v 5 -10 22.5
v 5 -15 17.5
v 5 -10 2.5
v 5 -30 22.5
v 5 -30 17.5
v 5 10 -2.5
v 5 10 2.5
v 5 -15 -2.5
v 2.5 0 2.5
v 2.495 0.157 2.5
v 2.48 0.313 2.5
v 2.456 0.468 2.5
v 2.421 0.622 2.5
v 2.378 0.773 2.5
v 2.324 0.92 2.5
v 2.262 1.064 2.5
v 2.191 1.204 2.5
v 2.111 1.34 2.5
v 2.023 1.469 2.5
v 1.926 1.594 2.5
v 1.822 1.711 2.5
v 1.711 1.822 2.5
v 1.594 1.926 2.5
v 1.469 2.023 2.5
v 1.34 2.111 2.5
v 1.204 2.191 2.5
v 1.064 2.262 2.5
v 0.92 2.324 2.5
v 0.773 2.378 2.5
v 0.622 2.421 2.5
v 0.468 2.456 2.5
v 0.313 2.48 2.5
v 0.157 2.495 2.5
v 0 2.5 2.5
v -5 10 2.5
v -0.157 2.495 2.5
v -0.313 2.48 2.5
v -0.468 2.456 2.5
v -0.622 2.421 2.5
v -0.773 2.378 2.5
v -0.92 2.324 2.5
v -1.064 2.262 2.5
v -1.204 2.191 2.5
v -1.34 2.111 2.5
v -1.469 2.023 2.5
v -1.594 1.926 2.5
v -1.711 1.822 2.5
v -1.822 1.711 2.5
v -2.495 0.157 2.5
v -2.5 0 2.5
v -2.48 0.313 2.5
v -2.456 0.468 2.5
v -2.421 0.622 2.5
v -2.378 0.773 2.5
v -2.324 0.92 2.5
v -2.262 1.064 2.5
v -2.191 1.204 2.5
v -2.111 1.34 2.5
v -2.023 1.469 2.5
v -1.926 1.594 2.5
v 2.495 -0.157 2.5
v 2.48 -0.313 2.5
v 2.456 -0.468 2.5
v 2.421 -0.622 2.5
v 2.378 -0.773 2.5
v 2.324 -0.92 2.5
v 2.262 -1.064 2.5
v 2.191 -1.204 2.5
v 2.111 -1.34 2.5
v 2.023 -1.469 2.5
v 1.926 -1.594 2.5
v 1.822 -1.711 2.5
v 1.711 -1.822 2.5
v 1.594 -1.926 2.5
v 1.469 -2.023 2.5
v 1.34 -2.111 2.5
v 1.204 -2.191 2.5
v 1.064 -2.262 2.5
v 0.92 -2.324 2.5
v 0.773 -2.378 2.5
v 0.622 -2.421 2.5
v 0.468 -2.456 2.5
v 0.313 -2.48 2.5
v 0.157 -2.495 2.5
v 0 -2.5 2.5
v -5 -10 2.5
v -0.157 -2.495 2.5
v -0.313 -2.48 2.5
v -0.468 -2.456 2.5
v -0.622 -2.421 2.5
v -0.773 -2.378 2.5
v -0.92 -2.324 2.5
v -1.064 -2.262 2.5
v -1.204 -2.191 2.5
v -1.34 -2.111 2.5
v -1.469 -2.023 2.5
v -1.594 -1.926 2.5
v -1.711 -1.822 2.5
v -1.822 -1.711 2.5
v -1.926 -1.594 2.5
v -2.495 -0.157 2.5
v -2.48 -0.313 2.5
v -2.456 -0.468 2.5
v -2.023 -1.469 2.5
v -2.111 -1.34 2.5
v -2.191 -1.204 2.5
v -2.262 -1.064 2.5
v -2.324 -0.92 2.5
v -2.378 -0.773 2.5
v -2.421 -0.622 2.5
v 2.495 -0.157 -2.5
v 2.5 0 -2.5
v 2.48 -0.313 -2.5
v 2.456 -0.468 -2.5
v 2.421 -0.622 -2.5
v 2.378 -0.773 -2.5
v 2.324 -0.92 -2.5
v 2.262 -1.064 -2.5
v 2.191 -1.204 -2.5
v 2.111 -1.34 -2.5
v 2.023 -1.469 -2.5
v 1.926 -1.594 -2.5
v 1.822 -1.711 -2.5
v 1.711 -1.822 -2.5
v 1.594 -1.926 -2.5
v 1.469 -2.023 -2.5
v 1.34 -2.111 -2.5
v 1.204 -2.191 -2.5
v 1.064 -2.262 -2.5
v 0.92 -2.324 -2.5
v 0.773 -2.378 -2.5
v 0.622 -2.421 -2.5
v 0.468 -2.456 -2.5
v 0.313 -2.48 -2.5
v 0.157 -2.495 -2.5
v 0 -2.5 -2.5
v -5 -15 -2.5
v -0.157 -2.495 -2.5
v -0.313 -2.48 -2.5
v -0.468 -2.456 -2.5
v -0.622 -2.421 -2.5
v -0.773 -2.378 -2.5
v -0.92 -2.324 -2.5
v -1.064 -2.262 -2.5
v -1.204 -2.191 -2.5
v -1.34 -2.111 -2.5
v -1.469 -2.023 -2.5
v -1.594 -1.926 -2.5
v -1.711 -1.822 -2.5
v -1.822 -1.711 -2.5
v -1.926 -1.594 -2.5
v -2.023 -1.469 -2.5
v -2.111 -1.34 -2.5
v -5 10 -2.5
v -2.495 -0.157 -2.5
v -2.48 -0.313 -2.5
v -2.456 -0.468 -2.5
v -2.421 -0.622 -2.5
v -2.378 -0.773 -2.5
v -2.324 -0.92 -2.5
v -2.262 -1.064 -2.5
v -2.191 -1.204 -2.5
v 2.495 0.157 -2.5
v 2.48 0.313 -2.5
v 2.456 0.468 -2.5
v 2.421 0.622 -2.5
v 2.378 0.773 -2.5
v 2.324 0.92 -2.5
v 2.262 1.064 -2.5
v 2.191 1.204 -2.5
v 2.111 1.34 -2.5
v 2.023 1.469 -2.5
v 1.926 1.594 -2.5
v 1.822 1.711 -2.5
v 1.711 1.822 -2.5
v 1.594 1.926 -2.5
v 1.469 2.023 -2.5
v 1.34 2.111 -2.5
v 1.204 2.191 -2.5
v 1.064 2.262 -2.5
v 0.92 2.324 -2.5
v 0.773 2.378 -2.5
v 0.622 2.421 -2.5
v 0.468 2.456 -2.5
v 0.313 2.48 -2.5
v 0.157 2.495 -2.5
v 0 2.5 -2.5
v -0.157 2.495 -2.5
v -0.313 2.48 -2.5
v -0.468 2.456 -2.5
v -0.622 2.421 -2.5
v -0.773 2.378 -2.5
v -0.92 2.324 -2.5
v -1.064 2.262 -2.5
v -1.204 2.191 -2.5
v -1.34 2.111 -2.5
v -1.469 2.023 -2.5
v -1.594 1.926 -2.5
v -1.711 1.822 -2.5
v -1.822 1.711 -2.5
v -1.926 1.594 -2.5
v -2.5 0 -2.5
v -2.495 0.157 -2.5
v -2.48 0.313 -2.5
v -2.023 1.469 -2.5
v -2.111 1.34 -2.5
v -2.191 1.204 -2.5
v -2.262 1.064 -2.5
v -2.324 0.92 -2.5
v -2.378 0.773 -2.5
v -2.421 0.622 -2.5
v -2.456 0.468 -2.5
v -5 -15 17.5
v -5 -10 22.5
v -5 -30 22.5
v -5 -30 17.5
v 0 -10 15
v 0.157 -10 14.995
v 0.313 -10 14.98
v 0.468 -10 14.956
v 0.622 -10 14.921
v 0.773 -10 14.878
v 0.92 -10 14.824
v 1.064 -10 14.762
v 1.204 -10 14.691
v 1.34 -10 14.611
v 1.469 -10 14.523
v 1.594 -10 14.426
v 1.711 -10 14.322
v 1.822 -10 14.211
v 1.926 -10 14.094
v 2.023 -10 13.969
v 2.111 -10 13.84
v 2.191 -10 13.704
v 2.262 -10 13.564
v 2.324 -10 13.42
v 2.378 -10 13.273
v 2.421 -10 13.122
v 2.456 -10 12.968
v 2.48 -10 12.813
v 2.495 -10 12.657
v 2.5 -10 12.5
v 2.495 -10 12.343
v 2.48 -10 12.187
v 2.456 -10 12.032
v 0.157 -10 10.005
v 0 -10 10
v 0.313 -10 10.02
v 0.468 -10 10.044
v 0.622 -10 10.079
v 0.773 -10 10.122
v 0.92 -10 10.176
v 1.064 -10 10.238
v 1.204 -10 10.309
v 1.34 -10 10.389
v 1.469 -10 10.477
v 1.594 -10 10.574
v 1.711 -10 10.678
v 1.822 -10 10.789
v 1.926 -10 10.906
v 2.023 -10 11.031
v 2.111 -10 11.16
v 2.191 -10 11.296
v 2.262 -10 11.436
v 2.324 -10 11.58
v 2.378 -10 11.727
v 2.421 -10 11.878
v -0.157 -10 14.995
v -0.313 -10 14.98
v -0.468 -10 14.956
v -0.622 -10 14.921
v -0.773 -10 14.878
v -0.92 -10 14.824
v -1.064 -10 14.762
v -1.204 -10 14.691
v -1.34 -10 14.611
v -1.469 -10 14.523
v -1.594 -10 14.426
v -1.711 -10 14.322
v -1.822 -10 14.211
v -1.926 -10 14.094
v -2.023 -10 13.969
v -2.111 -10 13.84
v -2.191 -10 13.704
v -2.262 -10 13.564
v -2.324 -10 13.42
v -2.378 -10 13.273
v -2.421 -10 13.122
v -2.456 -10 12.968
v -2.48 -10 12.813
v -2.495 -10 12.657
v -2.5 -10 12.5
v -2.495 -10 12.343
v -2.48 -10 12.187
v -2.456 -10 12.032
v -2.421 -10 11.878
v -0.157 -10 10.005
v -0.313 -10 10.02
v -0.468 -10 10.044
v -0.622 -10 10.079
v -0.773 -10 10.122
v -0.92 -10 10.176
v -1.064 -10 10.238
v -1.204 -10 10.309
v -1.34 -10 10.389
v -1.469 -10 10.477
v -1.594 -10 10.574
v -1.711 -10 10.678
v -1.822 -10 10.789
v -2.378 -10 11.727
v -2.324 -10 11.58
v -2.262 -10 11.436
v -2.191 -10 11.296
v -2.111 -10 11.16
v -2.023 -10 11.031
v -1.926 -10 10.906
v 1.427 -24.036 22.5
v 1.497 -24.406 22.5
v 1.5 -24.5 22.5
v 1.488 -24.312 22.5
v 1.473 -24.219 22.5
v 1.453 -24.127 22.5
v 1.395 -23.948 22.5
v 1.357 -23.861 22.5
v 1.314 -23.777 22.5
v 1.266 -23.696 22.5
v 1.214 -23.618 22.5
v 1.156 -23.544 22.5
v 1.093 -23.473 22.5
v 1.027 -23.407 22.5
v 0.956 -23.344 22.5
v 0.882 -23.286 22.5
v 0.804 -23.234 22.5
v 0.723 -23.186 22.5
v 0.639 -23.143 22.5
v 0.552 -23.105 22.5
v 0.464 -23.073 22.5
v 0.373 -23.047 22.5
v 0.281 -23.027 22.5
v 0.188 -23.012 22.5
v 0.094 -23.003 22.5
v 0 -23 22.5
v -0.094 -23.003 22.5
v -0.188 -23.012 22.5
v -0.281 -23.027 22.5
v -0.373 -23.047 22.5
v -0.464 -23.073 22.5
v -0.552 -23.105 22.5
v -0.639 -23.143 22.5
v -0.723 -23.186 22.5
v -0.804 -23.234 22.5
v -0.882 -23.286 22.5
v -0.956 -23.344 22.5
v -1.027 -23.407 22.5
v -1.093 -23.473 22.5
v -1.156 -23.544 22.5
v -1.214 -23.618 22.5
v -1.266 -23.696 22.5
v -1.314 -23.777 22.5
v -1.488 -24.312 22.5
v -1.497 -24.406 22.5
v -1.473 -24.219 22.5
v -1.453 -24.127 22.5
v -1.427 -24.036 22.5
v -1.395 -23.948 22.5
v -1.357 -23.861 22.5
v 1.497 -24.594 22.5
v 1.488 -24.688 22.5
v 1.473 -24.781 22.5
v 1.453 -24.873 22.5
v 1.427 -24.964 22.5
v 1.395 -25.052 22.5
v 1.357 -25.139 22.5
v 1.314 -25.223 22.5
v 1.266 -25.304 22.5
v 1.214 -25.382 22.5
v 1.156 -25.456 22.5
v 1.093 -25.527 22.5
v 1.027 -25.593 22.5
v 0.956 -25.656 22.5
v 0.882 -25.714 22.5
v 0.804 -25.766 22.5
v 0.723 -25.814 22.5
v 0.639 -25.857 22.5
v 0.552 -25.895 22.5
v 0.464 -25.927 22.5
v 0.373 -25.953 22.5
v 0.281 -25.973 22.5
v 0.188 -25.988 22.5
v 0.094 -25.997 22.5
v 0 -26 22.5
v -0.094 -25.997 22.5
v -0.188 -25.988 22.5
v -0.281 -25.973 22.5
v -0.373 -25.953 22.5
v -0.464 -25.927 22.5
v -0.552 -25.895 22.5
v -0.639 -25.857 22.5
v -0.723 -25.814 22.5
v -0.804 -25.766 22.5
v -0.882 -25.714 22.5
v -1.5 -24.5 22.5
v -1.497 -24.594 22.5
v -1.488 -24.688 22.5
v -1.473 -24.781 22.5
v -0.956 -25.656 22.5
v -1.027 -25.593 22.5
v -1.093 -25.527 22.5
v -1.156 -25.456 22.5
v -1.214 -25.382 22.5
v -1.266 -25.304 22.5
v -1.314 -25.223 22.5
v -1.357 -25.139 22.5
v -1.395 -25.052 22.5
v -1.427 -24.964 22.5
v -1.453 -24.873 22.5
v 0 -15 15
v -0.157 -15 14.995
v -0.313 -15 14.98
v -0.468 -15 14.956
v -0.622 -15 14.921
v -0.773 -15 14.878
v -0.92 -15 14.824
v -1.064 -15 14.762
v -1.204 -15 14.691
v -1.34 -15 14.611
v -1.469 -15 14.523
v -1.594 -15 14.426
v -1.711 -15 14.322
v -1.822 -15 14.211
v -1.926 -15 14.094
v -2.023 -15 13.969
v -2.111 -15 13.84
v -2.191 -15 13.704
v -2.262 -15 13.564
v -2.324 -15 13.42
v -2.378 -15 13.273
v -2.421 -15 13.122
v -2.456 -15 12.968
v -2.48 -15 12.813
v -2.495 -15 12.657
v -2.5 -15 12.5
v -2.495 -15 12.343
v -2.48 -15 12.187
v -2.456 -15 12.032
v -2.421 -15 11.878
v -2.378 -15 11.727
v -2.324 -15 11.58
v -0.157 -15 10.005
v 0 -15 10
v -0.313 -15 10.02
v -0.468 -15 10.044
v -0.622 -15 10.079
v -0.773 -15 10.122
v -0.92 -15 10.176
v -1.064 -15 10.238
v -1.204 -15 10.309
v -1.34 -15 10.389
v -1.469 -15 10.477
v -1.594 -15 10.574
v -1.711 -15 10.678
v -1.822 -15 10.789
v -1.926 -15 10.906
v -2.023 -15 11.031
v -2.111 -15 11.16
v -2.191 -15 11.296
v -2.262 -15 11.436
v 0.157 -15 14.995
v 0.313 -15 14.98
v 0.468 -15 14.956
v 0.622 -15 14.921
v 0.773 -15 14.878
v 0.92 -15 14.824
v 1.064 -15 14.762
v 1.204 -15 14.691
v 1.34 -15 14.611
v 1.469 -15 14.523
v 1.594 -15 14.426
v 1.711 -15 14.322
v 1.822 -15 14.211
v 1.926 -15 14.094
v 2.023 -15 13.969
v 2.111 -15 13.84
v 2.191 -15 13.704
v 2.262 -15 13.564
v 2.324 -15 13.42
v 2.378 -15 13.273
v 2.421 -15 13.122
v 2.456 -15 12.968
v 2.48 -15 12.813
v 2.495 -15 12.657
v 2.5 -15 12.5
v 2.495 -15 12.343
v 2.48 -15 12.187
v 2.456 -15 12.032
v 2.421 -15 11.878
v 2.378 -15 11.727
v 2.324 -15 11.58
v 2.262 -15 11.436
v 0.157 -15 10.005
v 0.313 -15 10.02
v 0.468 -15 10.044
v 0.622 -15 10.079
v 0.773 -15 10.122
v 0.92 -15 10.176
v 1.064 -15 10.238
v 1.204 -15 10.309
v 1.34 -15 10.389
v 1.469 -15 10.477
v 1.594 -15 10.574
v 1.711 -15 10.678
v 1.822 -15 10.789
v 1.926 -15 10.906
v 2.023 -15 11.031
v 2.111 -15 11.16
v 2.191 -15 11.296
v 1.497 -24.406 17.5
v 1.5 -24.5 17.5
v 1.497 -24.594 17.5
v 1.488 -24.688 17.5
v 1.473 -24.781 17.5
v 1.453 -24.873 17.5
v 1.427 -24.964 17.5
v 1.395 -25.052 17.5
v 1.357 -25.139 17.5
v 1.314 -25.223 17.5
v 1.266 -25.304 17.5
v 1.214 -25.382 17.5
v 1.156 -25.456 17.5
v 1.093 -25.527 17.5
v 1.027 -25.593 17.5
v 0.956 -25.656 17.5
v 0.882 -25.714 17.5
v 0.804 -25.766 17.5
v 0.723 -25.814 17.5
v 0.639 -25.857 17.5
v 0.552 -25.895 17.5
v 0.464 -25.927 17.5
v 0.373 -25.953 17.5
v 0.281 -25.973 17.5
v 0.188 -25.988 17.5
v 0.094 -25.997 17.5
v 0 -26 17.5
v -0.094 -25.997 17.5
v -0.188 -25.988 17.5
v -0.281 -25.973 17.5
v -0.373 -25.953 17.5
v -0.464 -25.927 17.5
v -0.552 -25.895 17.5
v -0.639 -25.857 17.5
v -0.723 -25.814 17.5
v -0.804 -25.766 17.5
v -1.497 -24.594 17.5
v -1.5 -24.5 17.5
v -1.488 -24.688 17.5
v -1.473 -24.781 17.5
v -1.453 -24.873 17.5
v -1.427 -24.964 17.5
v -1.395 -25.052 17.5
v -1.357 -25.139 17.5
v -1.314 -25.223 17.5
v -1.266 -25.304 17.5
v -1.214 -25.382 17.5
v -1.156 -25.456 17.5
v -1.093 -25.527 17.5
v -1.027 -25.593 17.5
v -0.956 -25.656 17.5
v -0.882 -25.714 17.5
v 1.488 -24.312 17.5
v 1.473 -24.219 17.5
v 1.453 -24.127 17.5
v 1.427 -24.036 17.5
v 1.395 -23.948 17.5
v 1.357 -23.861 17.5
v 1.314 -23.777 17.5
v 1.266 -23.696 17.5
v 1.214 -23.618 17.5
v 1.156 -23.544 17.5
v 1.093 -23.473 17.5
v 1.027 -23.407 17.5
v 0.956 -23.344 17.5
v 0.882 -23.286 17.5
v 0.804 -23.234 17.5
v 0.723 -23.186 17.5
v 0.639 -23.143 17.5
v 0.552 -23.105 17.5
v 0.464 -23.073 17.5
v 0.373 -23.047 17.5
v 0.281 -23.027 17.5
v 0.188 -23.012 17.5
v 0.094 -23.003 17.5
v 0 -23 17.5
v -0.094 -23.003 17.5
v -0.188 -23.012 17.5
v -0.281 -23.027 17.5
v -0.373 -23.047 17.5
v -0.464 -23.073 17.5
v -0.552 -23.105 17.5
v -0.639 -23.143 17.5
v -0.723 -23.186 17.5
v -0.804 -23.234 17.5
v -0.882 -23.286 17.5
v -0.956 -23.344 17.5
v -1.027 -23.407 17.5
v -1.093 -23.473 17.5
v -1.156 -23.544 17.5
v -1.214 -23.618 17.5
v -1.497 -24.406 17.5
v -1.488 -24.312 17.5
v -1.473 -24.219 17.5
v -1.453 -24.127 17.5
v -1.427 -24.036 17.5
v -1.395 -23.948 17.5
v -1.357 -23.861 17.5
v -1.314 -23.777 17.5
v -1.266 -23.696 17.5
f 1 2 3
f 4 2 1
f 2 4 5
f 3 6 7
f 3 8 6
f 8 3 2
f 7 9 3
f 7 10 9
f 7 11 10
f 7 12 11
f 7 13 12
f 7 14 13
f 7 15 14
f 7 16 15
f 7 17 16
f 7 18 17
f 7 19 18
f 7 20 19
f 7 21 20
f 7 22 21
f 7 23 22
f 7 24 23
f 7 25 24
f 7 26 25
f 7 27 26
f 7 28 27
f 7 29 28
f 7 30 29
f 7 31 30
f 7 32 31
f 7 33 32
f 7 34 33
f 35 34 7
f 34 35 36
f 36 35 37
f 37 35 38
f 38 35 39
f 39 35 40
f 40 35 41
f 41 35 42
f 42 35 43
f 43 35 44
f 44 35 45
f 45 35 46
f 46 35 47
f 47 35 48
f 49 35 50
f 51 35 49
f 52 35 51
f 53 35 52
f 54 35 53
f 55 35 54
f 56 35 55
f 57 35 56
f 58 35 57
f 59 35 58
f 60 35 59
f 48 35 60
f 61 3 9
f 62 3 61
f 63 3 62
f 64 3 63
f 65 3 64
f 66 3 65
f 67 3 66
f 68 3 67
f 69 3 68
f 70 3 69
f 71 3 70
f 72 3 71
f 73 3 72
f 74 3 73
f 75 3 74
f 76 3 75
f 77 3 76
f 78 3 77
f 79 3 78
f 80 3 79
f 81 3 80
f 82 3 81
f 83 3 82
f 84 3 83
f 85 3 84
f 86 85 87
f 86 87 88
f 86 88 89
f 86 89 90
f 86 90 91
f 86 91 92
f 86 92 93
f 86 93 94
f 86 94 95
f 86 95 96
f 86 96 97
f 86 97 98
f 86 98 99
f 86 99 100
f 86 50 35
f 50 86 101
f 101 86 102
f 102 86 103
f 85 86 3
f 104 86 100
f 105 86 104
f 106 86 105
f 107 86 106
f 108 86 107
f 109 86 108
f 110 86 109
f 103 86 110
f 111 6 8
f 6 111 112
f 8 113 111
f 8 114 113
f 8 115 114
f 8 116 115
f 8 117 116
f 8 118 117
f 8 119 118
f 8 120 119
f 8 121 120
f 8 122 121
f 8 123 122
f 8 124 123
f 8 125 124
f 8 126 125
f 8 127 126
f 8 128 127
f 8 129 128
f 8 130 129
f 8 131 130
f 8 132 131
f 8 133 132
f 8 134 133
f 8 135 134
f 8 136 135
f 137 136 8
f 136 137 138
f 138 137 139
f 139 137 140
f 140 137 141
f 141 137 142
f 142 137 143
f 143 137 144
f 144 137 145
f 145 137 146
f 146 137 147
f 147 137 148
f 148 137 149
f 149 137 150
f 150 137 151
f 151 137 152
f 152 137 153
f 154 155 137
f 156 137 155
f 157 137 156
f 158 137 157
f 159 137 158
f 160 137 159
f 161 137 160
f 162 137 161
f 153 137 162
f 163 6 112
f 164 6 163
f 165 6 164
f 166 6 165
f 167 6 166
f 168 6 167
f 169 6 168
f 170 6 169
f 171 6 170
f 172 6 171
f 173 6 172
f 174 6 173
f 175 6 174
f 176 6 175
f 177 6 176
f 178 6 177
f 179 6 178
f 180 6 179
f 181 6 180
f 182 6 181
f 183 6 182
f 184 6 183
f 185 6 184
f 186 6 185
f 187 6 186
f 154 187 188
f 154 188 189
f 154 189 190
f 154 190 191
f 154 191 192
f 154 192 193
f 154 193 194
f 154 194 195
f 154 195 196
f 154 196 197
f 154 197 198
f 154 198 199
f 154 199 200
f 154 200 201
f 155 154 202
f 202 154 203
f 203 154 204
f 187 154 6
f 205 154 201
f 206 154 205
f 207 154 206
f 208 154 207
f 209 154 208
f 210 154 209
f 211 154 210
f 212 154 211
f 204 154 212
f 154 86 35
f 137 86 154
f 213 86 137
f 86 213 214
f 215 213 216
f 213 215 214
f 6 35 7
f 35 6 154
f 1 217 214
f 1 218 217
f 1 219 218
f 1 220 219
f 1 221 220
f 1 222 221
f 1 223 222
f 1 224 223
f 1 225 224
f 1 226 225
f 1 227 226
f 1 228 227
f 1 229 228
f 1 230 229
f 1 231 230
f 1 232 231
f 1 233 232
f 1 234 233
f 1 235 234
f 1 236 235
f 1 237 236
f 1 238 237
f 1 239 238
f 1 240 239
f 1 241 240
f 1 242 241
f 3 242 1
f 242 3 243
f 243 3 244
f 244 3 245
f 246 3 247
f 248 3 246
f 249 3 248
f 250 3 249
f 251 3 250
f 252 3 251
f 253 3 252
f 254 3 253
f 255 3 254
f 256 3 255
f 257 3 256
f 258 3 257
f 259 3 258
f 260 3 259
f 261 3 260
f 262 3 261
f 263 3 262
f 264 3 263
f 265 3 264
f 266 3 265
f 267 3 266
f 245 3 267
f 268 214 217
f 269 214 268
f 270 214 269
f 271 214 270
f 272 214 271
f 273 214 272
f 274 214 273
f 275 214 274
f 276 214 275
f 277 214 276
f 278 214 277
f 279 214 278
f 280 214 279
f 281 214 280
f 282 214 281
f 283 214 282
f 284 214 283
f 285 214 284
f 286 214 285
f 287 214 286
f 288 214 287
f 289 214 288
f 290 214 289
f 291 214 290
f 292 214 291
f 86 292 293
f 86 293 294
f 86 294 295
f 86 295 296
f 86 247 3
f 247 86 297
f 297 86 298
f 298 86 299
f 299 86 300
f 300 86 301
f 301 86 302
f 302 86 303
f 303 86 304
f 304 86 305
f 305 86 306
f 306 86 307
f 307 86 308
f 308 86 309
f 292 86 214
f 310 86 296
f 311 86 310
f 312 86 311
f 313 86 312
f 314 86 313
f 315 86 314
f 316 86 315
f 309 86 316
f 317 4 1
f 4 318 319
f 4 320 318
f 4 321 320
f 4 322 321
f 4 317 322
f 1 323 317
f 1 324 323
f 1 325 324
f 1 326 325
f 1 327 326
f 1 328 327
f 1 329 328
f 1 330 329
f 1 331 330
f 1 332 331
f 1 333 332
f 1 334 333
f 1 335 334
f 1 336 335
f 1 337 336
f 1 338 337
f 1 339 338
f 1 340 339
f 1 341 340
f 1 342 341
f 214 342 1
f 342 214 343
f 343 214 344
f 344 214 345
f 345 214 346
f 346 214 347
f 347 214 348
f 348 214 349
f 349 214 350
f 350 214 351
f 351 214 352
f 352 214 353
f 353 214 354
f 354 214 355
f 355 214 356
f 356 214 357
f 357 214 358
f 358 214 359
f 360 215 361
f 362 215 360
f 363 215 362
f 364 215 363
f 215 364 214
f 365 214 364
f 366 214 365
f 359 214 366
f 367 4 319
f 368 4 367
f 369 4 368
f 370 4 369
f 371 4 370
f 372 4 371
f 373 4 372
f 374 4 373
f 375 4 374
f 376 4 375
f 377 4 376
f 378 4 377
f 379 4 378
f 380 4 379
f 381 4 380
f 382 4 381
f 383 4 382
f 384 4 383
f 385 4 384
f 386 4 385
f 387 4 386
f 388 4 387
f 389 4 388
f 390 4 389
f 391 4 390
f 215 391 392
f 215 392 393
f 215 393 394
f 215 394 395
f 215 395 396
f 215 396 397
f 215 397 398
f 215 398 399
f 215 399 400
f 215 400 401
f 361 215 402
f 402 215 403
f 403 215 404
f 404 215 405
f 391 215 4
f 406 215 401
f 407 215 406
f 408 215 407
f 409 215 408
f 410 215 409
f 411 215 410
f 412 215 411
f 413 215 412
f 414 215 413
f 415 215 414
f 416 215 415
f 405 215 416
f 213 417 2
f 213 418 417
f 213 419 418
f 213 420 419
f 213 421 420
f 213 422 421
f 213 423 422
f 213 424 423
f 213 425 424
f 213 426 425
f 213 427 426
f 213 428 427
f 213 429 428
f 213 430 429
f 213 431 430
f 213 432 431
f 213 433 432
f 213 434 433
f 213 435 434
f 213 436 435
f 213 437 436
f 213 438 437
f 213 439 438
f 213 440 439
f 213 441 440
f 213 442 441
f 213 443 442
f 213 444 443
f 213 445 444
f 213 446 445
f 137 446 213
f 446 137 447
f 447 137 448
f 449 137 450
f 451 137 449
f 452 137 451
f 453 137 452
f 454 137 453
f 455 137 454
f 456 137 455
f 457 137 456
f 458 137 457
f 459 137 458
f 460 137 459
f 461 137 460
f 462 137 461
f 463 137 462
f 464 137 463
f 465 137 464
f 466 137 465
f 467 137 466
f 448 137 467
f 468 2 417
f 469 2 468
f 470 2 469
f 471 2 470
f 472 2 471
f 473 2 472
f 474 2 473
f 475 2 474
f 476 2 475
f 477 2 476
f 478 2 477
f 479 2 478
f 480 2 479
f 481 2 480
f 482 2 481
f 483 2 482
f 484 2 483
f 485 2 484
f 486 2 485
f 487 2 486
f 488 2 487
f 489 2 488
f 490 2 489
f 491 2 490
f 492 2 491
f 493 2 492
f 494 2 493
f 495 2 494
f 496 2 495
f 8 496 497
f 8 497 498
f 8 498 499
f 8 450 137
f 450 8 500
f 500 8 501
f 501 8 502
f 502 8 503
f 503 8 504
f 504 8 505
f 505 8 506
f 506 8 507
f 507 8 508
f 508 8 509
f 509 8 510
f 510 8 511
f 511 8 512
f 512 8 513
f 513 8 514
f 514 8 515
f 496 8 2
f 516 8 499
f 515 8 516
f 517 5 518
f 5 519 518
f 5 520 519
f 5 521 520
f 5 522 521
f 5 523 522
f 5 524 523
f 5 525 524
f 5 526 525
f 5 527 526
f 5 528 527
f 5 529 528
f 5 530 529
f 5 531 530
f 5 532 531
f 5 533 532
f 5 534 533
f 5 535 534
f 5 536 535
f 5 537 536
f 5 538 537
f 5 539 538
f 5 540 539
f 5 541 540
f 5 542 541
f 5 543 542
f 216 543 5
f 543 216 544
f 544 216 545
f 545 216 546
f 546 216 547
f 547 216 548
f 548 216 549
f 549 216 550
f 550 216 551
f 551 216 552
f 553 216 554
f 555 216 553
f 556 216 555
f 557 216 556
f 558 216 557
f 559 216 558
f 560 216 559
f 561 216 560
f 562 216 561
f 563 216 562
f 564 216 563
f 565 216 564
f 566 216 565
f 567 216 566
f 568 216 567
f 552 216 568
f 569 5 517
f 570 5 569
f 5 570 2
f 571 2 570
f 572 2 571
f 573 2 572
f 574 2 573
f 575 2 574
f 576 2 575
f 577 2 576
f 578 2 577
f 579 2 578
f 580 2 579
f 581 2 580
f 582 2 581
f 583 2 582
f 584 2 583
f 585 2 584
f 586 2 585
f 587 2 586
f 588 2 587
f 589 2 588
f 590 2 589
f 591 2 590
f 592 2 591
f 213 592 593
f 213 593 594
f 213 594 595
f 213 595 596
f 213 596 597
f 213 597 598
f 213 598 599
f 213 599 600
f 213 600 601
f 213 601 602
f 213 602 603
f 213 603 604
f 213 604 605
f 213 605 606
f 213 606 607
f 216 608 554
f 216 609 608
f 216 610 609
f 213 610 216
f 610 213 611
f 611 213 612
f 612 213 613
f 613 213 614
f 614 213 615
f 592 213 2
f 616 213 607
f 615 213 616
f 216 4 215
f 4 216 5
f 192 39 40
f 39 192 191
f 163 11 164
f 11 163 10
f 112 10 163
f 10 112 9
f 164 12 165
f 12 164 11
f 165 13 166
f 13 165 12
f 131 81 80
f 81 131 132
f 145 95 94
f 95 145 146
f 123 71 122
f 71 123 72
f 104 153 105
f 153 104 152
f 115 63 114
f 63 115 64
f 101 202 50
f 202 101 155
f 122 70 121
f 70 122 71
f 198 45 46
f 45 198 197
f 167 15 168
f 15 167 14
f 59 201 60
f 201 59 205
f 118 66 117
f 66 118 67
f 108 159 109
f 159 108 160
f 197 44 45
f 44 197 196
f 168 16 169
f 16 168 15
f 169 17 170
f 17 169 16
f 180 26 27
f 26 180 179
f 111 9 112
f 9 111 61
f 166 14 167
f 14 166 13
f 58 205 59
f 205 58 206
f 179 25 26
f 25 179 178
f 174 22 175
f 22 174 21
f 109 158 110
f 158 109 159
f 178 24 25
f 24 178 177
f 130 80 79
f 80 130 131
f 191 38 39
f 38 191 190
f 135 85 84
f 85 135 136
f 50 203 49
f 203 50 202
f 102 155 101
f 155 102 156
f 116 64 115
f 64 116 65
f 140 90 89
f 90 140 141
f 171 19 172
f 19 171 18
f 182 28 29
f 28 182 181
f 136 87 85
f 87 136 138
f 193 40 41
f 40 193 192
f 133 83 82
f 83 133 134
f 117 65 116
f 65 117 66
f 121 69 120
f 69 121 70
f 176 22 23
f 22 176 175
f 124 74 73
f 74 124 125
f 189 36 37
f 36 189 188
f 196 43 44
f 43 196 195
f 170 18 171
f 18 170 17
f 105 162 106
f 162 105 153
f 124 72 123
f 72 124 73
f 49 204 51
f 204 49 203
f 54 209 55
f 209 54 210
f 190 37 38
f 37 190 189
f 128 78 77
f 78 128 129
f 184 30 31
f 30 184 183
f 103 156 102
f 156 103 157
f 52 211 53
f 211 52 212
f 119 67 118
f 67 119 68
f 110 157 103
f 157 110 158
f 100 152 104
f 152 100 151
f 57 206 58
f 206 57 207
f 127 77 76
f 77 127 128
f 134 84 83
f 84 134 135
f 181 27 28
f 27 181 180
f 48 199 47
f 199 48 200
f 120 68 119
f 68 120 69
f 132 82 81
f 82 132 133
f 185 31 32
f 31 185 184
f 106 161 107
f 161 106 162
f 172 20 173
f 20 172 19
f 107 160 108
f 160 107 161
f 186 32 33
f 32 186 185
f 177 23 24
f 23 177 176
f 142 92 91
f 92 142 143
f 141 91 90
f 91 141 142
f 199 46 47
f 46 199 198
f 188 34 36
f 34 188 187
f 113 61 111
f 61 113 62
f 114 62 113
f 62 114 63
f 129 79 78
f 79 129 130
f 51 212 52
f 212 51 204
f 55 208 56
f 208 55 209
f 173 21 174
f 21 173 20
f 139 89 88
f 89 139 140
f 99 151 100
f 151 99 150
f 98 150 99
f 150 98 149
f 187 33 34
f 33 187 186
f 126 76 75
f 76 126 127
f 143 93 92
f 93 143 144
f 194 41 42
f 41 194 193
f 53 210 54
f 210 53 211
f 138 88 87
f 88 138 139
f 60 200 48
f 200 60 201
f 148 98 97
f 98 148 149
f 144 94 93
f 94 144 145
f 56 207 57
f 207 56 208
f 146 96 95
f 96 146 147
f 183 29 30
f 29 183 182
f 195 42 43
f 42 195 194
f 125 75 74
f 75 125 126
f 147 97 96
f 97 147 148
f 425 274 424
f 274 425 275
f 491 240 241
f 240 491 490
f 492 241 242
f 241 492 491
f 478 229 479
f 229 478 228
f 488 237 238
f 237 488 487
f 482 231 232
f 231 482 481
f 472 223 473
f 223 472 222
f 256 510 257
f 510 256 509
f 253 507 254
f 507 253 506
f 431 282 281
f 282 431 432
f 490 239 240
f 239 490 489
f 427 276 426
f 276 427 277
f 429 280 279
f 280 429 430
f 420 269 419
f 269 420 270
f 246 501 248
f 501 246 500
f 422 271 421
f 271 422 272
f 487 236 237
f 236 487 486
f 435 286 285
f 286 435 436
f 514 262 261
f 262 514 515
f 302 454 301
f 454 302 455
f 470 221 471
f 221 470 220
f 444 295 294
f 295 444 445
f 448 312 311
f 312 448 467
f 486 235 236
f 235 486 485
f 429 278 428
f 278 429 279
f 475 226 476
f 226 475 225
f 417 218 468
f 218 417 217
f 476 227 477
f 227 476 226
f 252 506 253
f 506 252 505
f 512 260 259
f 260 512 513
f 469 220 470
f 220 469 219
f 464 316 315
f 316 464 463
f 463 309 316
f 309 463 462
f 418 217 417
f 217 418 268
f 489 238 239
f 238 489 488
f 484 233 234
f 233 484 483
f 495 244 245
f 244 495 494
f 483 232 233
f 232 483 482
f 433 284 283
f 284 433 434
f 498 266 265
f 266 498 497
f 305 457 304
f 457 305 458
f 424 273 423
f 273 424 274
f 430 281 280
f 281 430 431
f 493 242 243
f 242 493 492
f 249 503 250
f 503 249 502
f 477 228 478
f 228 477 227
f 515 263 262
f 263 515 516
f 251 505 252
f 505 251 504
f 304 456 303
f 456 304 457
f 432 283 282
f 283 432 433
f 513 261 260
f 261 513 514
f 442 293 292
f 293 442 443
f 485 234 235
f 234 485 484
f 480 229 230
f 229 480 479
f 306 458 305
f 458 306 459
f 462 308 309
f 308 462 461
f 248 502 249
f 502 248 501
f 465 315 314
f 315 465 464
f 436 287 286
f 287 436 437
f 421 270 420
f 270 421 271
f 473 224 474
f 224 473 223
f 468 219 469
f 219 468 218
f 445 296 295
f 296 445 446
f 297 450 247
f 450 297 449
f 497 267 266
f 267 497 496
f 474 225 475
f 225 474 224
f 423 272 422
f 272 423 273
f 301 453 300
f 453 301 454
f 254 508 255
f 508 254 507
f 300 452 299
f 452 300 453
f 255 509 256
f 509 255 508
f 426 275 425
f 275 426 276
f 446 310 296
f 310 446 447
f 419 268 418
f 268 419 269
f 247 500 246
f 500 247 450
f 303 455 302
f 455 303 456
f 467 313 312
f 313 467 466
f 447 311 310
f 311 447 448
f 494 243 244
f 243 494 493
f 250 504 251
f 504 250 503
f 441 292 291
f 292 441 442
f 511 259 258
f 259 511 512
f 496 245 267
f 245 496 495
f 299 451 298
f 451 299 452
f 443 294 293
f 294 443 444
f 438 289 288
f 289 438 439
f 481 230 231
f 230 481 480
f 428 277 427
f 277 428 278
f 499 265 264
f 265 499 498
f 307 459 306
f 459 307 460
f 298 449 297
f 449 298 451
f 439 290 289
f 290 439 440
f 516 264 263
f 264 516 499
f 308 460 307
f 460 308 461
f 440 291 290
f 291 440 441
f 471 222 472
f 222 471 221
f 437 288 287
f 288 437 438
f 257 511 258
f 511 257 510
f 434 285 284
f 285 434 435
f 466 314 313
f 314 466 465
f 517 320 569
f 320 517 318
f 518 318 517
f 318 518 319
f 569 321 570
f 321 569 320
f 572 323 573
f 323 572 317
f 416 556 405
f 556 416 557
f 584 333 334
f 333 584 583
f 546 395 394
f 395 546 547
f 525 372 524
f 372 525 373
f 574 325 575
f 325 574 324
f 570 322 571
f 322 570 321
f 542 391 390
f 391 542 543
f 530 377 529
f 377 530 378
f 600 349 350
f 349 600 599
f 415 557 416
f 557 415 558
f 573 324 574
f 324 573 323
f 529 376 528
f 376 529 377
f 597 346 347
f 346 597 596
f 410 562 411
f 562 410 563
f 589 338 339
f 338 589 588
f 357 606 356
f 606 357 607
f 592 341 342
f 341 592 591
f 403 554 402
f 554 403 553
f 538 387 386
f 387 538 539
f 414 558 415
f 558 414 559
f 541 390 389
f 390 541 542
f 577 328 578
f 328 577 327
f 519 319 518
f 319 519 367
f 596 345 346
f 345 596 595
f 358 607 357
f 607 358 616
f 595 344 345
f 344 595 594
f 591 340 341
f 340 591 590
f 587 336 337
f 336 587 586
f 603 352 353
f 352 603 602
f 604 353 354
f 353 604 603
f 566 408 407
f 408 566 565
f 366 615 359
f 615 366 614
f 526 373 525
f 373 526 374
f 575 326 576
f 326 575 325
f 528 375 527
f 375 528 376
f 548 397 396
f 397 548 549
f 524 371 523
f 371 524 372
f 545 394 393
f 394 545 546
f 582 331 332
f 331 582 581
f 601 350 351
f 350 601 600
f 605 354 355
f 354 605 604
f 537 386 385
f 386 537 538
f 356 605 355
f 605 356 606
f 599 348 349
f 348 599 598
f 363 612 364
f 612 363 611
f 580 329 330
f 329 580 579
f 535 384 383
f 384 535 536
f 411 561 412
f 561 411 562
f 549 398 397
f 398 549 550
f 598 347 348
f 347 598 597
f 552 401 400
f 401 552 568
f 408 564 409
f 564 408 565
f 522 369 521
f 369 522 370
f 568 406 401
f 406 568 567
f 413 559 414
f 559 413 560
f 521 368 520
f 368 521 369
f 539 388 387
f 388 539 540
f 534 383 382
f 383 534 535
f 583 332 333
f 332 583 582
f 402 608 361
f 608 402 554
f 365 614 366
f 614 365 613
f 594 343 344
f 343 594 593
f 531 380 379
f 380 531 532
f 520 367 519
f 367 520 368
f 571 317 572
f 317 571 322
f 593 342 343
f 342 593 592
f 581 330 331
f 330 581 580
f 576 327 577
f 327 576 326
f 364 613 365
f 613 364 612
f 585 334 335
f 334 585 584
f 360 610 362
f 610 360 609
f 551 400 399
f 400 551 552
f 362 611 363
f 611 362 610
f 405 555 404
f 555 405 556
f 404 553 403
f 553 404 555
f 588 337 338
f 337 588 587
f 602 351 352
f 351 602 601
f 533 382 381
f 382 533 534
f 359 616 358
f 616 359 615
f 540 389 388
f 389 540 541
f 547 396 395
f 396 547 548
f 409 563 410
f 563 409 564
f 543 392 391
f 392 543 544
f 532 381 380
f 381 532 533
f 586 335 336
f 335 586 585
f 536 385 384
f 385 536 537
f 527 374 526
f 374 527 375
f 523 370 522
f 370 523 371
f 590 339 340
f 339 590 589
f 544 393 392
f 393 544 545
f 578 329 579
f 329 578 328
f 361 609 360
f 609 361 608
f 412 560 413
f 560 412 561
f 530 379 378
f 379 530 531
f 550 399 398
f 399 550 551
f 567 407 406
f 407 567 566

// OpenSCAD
$fn=100;

module bed_mount(color="purple") {
    color(color,1.0) difference(){
        union() {
            cube([10,20,5],true);
            translate([0,-12.5,10]) cube([10,5,25],true);
            translate([0,-20,20]) cube([10,20,5],true);
        }
        cylinder(r=2.5,h=7,center=true);
        rotate(90,[1,0,0]) translate([0,12.5,13]) cylinder(r=2.5,h=7,center=true);
        translate([0,-24.5,20]) cylinder(r=1.5,h=7,center=true);
    }
}

bed_mount();
